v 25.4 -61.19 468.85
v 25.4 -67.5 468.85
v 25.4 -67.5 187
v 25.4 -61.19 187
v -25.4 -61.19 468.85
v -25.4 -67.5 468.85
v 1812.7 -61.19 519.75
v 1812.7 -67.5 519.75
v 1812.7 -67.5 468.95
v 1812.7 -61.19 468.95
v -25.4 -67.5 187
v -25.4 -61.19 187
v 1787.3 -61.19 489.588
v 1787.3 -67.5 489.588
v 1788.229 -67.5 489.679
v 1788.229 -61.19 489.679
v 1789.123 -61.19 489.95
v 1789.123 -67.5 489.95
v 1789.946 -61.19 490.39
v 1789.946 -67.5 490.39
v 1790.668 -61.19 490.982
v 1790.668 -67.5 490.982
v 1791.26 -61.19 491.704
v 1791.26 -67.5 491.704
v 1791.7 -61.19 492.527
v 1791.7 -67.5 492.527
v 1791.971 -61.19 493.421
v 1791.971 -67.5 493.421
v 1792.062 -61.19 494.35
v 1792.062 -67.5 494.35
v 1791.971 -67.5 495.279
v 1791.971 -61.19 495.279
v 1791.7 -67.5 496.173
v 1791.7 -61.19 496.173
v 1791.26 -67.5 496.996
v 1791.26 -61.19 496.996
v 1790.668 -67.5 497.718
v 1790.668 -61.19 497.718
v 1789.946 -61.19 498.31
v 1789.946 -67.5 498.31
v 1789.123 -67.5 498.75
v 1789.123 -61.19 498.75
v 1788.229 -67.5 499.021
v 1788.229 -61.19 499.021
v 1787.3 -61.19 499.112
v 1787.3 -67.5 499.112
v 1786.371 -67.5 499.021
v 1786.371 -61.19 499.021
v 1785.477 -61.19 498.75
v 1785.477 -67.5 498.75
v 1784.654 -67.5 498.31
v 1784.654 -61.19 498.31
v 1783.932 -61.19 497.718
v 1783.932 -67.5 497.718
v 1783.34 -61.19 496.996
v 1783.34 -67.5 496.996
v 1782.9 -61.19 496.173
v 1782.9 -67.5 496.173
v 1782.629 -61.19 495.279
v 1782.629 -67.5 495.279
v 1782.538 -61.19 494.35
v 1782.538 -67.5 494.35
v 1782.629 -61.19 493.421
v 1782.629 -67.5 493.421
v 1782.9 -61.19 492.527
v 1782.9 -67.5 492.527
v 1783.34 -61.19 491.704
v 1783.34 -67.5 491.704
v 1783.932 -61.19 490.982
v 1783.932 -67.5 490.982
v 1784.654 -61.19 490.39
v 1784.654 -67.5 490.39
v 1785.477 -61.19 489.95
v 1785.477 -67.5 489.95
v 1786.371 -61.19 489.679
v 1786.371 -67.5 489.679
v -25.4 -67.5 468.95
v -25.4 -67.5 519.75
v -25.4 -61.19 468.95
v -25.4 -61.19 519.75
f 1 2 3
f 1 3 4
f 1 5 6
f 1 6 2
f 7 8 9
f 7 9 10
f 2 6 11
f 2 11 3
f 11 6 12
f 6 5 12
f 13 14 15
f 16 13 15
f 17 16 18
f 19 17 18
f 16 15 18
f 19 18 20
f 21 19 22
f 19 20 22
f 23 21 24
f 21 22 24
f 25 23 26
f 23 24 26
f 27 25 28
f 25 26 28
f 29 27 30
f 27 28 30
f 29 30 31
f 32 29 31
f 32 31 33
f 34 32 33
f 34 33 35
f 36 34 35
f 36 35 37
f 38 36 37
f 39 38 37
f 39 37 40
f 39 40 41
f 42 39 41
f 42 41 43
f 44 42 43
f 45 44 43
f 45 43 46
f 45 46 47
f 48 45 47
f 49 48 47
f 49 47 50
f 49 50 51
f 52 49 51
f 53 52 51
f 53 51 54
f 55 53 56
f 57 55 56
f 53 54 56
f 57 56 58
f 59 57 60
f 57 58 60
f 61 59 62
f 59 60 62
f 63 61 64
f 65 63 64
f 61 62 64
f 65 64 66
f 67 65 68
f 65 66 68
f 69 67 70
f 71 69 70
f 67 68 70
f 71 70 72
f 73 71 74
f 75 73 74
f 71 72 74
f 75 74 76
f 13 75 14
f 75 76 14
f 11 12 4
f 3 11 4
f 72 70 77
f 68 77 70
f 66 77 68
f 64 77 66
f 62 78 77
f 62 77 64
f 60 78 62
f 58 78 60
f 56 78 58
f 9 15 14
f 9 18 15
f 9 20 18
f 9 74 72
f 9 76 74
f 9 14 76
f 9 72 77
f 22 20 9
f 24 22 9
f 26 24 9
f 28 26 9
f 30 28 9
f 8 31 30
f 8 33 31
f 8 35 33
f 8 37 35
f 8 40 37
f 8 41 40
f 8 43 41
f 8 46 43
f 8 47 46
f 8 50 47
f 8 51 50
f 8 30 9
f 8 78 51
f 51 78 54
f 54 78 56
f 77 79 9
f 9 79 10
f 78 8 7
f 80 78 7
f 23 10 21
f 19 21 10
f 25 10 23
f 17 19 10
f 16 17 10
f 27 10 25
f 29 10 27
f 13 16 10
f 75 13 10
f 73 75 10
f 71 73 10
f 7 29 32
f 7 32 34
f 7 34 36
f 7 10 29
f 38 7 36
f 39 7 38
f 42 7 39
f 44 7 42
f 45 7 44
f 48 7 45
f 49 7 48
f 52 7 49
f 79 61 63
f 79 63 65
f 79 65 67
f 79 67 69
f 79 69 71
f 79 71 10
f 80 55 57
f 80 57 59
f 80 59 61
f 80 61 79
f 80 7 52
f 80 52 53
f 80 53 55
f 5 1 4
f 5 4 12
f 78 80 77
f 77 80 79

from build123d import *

# Parameters (mm, degrees)
CROQUIS2_W              = 50.8
CROQUIS2_H              = 135
SALIENTE_EXTRUIR1_DEPTH = 6.31
CROQUIS3_W              = 50.8
CROQUIS3_H              = 6.31
SALIENTE_EXTRUIR2_DEPTH = 513.44
CROQUIS4_W              = 50.8
CROQUIS4_H              = 6.31
SALIENTE_EXTRUIR3_DEPTH = 1787.3
CROQUIS9_W              = 50.8
CROQUIS9_H              = 6.31
SALIENTE_EXTRUIR4_DEPTH = 98
CROQUIS12_R             = 5
CORTAR_EXTRUIR1_DEPTH   = 10
CORTAR_EXTRUIR2_DEPTH   = 73
CROQUIS16_W             = 47.2
CROQUIS16_H             = 68.495521413
CORTAR_EXTRUIR5_DEPTH   = 10
CROQUIS17_W             = 50.8
CROQUIS17_H             = 0.1
CORTAR_EXTRUIR6_DEPTH   = 50.8
CROQUIS18_W             = 50.8
CROQUIS18_H             = 0.1
CORTAR_EXTRUIR7_DEPTH   = 50.8
CROQUIS20_R             = 5
CORTAR_EXTRUIR9_DEPTH   = 33
CROQUIS25_R             = 4.7625
CORTAR_EXTRUIR13_DEPTH  = 50
CROQUIS29_W             = 50.8
CROQUIS29_H             = 6.31
SALIENTE_EXTRUIR5_DEPTH = 100
CORTAR_EXTRUIR17_DEPTH  = 68
CROQUIS33_W             = 50.8
CROQUIS33_H             = 187
CORTAR_EXTRUIR18_DEPTH  = 74
CORTAR_EXTRUIR19_DEPTH  = 121


with BuildPart() as part:
    # Croquis2 → Saliente-Extruir1 (new body)
    with BuildSketch(Plane.XY):
        Rectangle(CROQUIS2_W, CROQUIS2_H)
    extrude(amount=SALIENTE_EXTRUIR1_DEPTH)

    # Croquis3 → Saliente-Extruir2 (add)
    with BuildSketch(Plane.XY.offset(6.31)):
        with Locations((0, -64.345)):
            Rectangle(CROQUIS3_W, CROQUIS3_H)
    extrude(amount=SALIENTE_EXTRUIR2_DEPTH)

    # Croquis4 → Saliente-Extruir3 (add)
    with BuildSketch(Plane(origin=(25.4, 0, 0), x_dir=(0, 0, -1), z_dir=(1, 0, 0))):
        with Locations((-494.35, -64.345)):
            Rectangle(CROQUIS4_W, CROQUIS4_H)
    extrude(amount=SALIENTE_EXTRUIR3_DEPTH)

    # Barrer2: sweep along a curve in space
    with BuildLine() as barrer2_path:
        Line((1787.3, -64.345, 519.75), (1787.3, -64.345, 642.06))
        Line((1787.3, -64.345, 642.06), (1787.3, 66.675, 642.06))
        Line((1787.3, 66.675, 642.06), (1787.3, 66.675, 1436.06))
    # Croquis9 → Barrer2 (sweep)
    with BuildSketch(Plane.XY.offset(519.75)):
        with Locations((1787.3, -64.345)):
            Rectangle(CROQUIS9_W, CROQUIS9_H)
    sweep(path=barrer2_path.line, transition=Transition.RIGHT)

    # Croquis11 → Saliente-Extruir4 (add)
    with BuildSketch(Plane.ZY.offset(25.4)):
        Polygon((0, 67.5), (-31.60126178, 124.808722595), (-26.075659426, 127.855658535), (6.31, 67.5), align=None)
    extrude(amount=-SALIENTE_EXTRUIR4_DEPTH)

    # Croquis12 → Cortar-Extruir1 (cut)
    with BuildSketch(Plane(origin=(0, 69.83, 0), x_dir=(1, 0, 0), z_dir=(0, 1, 0))):
        with Locations(Location((1787.3, -1403.06, 0), (0, 0, 270))):
            Circle(CROQUIS12_R)
        with Locations(Location((1787.3, -1183.06, 0), (0, 0, 270))):
            Circle(CROQUIS12_R)
    extrude(amount=-CORTAR_EXTRUIR1_DEPTH, mode=Mode.SUBTRACT)

    # Croquis13 → Cortar-Extruir2 (cut)
    with BuildSketch(Plane(origin=(1812.7, 0, 0), x_dir=(0, 0, -1), z_dir=(1, 0, 0))):
        Polygon((-645.215, 56.71628726), (-638.905, 56.71628726), (-638.905, 69.83), (-1436.06, 69.83), (-1436.06, 63.52), (-645.215, 63.52), align=None)
    extrude(amount=-CORTAR_EXTRUIR2_DEPTH, mode=Mode.SUBTRACT)

    # Croquis16 → Cortar-Extruir5 (cut)
    with BuildSketch(Plane(origin=(0, 17.718759704, 33.021634554), x_dir=(1, 0, 0), z_dir=(0, 0.47281426227300877, 0.8811621152723433))):
        with Locations((49, 90.742745493)):
            Rectangle(CROQUIS16_W, CROQUIS16_H)
    extrude(amount=-CORTAR_EXTRUIR5_DEPTH, mode=Mode.SUBTRACT)

    # Croquis17 → Cortar-Extruir6 (cut)
    with BuildSketch(Plane(origin=(0, -61.19, 0), x_dir=(1, 0, 0), z_dir=(0, 1, 0))):
        with Locations((0, -468.9)):
            Rectangle(CROQUIS17_W, CROQUIS17_H)
    extrude(amount=-CORTAR_EXTRUIR6_DEPTH, mode=Mode.SUBTRACT)


with BuildPart() as cortar_extruir6_piece_1:
    # of the separate pieces the step leaves, piece 1, a body of its own (cortar_extruir6_pieces)
    add(part.part.solids().sort_by_distance((-25.4, -61.19, 468.95))[0])

    # Croquis18 → Cortar-Extruir7 (cut)
    with BuildSketch(Plane(origin=(0, -61.19, 0), x_dir=(1, 0, 0), z_dir=(0, 1, 0))):
        with Locations((1787.3, -519.8)):
            Rectangle(CROQUIS18_W, CROQUIS18_H)
    extrude(amount=-CORTAR_EXTRUIR7_DEPTH, mode=Mode.SUBTRACT)


with BuildPart() as cortar_extruir6_piece_2:
    # of the separate pieces the step leaves, piece 2, a body of its own (cortar_extruir6_pieces)
    add(part.part.solids().sort_by_distance((-25.4, -61.19, 6.31))[0])

    # Croquis32 → Cortar-Extruir17 (cut)
    with BuildSketch(Plane.ZY.offset(25.4)):
        Polygon((6.31, -61.19), (0, -61.19), (0, 67.5), (-31.60126178, 124.808722595), (-26.075659426, 127.855658535), (6.31, 67.5), align=None)
    extrude(amount=-CORTAR_EXTRUIR17_DEPTH, mode=Mode.SUBTRACT)

    # Croquis33 → Cortar-Extruir18 (cut)
    with BuildSketch(Plane(origin=(0, -61.19, 0), x_dir=(1, 0, 0), z_dir=(0, 1, 0))):
        with Locations((0, -93.5)):
            Rectangle(CROQUIS33_W, CROQUIS33_H)
    extrude(amount=-CORTAR_EXTRUIR18_DEPTH, mode=Mode.SUBTRACT)


with BuildPart() as cortar_extruir7_piece_1:
    # of the separate pieces the step leaves, piece 1, a body of its own (cortar_extruir7_pieces)
    add(cortar_extruir6_piece_1.part.solids().sort_by_distance((-25.4, -61.19, 468.95))[0])

    # Croquis25 → Cortar-Extruir13 (cut)
    with BuildSketch(Plane(origin=(0, -67.5, 0), x_dir=(-1, 0, 0), z_dir=(0, -1, 0))):
        with Locations(Location((-1787.3, -494.35, 0), (0, 0, 90))):
            Circle(CROQUIS25_R)
    extrude(amount=-CORTAR_EXTRUIR13_DEPTH, mode=Mode.SUBTRACT)


with BuildPart() as cortar_extruir7_piece_2:
    # of the separate pieces the step leaves, piece 2, a body of its own (cortar_extruir7_pieces)
    add(cortar_extruir6_piece_1.part.solids().sort_by_distance((1812.7, -61.19, 638.905))[0])

    # Croquis20 → Cortar-Extruir9 (cut)
    with BuildSketch(Plane(origin=(0, 0, 638.905), x_dir=(-1, 0, 0), z_dir=(0, 0, -1))):
        with Locations((-1787.3, 22.71628726)):
            Circle(CROQUIS20_R)
    extrude(amount=-CORTAR_EXTRUIR9_DEPTH, mode=Mode.SUBTRACT)

    # Croquis29 → Saliente-Extruir5 (add)
    with BuildSketch(Plane(origin=(0, 56.71628726, 0), x_dir=(1, 0, 0), z_dir=(0, 1, 0))):
        with Locations((1787.3, -642.06)):
            Rectangle(CROQUIS29_W, CROQUIS29_H)
    extrude(amount=SALIENTE_EXTRUIR5_DEPTH)

    # Croquis34 → Cortar-Extruir19 (cut)
    with BuildSketch(Plane(origin=(1812.7, 0, 0), x_dir=(0, 0, -1), z_dir=(1, 0, 0))):
        Polygon((-519.85, -61.19), (-519.85, -67.5), (-645.215, -67.5), (-645.215, 156.71628726), (-638.905, 156.71628726), (-638.905, -61.19), align=None)
    extrude(amount=-CORTAR_EXTRUIR19_DEPTH, mode=Mode.SUBTRACT)


solid = Compound([cortar_extruir6_piece_2.part, cortar_extruir7_piece_1.part])
